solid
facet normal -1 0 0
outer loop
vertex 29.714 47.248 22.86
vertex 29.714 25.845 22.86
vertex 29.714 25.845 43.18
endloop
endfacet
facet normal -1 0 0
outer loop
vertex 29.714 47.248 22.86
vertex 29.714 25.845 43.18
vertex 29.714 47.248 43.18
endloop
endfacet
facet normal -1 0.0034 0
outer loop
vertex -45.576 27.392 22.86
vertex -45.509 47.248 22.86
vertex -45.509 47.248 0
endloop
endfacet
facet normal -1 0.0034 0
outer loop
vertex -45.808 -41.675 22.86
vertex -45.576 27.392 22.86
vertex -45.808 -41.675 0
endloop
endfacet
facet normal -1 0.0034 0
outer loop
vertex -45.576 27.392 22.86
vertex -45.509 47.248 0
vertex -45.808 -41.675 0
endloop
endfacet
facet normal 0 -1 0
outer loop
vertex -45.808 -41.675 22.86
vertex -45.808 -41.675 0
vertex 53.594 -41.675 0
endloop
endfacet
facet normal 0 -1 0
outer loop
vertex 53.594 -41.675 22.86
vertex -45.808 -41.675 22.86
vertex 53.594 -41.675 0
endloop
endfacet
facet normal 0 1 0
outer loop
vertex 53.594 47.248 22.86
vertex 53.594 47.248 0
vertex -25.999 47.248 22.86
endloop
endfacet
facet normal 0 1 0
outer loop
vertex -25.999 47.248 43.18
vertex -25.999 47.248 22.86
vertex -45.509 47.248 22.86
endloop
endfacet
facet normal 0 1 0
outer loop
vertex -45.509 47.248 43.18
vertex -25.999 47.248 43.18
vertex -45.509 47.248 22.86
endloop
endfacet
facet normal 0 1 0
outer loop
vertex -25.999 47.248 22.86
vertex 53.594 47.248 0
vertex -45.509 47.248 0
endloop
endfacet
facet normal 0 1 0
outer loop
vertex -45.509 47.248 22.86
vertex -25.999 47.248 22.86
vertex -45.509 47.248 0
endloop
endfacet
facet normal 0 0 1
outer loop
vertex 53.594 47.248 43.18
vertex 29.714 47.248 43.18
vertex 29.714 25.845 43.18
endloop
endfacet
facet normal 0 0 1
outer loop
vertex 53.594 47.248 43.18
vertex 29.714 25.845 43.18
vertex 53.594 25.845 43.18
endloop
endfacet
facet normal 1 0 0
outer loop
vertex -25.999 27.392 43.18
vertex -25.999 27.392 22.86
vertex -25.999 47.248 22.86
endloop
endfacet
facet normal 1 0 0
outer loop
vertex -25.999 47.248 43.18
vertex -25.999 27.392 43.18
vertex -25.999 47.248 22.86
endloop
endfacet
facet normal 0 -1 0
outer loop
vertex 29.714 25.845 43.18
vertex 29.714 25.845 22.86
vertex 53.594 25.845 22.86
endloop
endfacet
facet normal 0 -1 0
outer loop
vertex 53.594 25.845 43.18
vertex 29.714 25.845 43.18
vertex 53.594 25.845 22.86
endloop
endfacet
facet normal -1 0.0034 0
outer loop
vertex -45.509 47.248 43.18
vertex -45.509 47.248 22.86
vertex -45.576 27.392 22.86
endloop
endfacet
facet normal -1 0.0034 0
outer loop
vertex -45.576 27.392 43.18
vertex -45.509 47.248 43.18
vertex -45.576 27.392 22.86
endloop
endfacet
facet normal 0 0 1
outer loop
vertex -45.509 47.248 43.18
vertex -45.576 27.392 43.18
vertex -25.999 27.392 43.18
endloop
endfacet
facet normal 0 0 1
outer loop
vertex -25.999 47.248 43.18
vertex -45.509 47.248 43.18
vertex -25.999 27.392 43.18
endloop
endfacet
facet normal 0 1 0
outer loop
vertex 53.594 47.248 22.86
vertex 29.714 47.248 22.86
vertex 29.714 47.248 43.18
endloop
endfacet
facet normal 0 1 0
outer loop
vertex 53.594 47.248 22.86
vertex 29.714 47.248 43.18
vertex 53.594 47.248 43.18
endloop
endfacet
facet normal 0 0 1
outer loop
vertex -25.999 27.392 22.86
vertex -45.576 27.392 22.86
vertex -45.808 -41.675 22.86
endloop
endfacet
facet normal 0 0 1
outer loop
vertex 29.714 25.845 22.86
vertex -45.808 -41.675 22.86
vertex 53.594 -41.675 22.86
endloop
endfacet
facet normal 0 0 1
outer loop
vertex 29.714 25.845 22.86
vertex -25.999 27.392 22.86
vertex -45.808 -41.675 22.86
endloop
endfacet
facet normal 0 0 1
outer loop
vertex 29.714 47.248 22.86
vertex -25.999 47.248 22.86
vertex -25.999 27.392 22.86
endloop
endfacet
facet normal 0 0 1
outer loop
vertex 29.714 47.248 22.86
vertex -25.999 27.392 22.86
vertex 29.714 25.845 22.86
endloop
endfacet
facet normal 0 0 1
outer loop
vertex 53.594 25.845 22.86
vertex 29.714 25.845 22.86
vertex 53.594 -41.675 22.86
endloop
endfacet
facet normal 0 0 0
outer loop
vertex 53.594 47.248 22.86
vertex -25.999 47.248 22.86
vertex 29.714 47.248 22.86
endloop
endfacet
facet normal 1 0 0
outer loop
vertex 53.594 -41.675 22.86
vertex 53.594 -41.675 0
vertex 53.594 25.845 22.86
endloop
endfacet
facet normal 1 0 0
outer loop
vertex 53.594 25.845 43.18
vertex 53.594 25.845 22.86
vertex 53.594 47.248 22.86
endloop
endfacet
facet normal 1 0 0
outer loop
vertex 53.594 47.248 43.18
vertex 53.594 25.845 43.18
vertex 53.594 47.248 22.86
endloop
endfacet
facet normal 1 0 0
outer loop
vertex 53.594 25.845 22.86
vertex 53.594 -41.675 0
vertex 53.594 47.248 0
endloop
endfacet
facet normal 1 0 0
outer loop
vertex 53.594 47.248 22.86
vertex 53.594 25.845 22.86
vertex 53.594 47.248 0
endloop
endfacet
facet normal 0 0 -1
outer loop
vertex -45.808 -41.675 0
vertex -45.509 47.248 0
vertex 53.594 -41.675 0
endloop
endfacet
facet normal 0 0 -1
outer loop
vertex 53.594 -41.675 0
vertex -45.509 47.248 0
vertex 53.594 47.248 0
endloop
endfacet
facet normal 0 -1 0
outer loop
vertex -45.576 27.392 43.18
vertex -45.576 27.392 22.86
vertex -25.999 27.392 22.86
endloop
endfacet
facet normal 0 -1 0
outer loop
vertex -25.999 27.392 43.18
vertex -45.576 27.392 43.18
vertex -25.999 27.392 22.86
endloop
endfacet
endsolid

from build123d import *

# Parameters (mm, degrees)
F1_DEPTH = 22.86
F2_W     = 23.88052
F2_H     = 21.403259
F3_DEPTH = 20.32
F5_DEPTH = 20.32


with BuildPart() as f1:
    # F0 (on Top) → F1 (new body)
    with BuildSketch(Plane.XY):
        Polygon((-45.509029, 47.247883), (-45.808434, -41.675467), (53.594097, -41.675467), (53.594097, 47.247883), align=None)
    extrude(amount=F1_DEPTH)

    # F2 (on face) → F3 (join)
    with BuildSketch(Plane.XY.offset(22.86)):
        with Locations((41.653837, 36.546253)):
            Rectangle(F2_W, F2_H)
    extrude(amount=F3_DEPTH)

    # F4 (on face) → F5 (join)
    with BuildSketch(Plane.XY.offset(22.86)):
        Polygon((-25.999382, 27.392207), (-25.999382, 47.247883), (-45.509029, 47.247883), (-45.575883, 27.392207), align=None)
    extrude(amount=F5_DEPTH)


solid = f1.part
